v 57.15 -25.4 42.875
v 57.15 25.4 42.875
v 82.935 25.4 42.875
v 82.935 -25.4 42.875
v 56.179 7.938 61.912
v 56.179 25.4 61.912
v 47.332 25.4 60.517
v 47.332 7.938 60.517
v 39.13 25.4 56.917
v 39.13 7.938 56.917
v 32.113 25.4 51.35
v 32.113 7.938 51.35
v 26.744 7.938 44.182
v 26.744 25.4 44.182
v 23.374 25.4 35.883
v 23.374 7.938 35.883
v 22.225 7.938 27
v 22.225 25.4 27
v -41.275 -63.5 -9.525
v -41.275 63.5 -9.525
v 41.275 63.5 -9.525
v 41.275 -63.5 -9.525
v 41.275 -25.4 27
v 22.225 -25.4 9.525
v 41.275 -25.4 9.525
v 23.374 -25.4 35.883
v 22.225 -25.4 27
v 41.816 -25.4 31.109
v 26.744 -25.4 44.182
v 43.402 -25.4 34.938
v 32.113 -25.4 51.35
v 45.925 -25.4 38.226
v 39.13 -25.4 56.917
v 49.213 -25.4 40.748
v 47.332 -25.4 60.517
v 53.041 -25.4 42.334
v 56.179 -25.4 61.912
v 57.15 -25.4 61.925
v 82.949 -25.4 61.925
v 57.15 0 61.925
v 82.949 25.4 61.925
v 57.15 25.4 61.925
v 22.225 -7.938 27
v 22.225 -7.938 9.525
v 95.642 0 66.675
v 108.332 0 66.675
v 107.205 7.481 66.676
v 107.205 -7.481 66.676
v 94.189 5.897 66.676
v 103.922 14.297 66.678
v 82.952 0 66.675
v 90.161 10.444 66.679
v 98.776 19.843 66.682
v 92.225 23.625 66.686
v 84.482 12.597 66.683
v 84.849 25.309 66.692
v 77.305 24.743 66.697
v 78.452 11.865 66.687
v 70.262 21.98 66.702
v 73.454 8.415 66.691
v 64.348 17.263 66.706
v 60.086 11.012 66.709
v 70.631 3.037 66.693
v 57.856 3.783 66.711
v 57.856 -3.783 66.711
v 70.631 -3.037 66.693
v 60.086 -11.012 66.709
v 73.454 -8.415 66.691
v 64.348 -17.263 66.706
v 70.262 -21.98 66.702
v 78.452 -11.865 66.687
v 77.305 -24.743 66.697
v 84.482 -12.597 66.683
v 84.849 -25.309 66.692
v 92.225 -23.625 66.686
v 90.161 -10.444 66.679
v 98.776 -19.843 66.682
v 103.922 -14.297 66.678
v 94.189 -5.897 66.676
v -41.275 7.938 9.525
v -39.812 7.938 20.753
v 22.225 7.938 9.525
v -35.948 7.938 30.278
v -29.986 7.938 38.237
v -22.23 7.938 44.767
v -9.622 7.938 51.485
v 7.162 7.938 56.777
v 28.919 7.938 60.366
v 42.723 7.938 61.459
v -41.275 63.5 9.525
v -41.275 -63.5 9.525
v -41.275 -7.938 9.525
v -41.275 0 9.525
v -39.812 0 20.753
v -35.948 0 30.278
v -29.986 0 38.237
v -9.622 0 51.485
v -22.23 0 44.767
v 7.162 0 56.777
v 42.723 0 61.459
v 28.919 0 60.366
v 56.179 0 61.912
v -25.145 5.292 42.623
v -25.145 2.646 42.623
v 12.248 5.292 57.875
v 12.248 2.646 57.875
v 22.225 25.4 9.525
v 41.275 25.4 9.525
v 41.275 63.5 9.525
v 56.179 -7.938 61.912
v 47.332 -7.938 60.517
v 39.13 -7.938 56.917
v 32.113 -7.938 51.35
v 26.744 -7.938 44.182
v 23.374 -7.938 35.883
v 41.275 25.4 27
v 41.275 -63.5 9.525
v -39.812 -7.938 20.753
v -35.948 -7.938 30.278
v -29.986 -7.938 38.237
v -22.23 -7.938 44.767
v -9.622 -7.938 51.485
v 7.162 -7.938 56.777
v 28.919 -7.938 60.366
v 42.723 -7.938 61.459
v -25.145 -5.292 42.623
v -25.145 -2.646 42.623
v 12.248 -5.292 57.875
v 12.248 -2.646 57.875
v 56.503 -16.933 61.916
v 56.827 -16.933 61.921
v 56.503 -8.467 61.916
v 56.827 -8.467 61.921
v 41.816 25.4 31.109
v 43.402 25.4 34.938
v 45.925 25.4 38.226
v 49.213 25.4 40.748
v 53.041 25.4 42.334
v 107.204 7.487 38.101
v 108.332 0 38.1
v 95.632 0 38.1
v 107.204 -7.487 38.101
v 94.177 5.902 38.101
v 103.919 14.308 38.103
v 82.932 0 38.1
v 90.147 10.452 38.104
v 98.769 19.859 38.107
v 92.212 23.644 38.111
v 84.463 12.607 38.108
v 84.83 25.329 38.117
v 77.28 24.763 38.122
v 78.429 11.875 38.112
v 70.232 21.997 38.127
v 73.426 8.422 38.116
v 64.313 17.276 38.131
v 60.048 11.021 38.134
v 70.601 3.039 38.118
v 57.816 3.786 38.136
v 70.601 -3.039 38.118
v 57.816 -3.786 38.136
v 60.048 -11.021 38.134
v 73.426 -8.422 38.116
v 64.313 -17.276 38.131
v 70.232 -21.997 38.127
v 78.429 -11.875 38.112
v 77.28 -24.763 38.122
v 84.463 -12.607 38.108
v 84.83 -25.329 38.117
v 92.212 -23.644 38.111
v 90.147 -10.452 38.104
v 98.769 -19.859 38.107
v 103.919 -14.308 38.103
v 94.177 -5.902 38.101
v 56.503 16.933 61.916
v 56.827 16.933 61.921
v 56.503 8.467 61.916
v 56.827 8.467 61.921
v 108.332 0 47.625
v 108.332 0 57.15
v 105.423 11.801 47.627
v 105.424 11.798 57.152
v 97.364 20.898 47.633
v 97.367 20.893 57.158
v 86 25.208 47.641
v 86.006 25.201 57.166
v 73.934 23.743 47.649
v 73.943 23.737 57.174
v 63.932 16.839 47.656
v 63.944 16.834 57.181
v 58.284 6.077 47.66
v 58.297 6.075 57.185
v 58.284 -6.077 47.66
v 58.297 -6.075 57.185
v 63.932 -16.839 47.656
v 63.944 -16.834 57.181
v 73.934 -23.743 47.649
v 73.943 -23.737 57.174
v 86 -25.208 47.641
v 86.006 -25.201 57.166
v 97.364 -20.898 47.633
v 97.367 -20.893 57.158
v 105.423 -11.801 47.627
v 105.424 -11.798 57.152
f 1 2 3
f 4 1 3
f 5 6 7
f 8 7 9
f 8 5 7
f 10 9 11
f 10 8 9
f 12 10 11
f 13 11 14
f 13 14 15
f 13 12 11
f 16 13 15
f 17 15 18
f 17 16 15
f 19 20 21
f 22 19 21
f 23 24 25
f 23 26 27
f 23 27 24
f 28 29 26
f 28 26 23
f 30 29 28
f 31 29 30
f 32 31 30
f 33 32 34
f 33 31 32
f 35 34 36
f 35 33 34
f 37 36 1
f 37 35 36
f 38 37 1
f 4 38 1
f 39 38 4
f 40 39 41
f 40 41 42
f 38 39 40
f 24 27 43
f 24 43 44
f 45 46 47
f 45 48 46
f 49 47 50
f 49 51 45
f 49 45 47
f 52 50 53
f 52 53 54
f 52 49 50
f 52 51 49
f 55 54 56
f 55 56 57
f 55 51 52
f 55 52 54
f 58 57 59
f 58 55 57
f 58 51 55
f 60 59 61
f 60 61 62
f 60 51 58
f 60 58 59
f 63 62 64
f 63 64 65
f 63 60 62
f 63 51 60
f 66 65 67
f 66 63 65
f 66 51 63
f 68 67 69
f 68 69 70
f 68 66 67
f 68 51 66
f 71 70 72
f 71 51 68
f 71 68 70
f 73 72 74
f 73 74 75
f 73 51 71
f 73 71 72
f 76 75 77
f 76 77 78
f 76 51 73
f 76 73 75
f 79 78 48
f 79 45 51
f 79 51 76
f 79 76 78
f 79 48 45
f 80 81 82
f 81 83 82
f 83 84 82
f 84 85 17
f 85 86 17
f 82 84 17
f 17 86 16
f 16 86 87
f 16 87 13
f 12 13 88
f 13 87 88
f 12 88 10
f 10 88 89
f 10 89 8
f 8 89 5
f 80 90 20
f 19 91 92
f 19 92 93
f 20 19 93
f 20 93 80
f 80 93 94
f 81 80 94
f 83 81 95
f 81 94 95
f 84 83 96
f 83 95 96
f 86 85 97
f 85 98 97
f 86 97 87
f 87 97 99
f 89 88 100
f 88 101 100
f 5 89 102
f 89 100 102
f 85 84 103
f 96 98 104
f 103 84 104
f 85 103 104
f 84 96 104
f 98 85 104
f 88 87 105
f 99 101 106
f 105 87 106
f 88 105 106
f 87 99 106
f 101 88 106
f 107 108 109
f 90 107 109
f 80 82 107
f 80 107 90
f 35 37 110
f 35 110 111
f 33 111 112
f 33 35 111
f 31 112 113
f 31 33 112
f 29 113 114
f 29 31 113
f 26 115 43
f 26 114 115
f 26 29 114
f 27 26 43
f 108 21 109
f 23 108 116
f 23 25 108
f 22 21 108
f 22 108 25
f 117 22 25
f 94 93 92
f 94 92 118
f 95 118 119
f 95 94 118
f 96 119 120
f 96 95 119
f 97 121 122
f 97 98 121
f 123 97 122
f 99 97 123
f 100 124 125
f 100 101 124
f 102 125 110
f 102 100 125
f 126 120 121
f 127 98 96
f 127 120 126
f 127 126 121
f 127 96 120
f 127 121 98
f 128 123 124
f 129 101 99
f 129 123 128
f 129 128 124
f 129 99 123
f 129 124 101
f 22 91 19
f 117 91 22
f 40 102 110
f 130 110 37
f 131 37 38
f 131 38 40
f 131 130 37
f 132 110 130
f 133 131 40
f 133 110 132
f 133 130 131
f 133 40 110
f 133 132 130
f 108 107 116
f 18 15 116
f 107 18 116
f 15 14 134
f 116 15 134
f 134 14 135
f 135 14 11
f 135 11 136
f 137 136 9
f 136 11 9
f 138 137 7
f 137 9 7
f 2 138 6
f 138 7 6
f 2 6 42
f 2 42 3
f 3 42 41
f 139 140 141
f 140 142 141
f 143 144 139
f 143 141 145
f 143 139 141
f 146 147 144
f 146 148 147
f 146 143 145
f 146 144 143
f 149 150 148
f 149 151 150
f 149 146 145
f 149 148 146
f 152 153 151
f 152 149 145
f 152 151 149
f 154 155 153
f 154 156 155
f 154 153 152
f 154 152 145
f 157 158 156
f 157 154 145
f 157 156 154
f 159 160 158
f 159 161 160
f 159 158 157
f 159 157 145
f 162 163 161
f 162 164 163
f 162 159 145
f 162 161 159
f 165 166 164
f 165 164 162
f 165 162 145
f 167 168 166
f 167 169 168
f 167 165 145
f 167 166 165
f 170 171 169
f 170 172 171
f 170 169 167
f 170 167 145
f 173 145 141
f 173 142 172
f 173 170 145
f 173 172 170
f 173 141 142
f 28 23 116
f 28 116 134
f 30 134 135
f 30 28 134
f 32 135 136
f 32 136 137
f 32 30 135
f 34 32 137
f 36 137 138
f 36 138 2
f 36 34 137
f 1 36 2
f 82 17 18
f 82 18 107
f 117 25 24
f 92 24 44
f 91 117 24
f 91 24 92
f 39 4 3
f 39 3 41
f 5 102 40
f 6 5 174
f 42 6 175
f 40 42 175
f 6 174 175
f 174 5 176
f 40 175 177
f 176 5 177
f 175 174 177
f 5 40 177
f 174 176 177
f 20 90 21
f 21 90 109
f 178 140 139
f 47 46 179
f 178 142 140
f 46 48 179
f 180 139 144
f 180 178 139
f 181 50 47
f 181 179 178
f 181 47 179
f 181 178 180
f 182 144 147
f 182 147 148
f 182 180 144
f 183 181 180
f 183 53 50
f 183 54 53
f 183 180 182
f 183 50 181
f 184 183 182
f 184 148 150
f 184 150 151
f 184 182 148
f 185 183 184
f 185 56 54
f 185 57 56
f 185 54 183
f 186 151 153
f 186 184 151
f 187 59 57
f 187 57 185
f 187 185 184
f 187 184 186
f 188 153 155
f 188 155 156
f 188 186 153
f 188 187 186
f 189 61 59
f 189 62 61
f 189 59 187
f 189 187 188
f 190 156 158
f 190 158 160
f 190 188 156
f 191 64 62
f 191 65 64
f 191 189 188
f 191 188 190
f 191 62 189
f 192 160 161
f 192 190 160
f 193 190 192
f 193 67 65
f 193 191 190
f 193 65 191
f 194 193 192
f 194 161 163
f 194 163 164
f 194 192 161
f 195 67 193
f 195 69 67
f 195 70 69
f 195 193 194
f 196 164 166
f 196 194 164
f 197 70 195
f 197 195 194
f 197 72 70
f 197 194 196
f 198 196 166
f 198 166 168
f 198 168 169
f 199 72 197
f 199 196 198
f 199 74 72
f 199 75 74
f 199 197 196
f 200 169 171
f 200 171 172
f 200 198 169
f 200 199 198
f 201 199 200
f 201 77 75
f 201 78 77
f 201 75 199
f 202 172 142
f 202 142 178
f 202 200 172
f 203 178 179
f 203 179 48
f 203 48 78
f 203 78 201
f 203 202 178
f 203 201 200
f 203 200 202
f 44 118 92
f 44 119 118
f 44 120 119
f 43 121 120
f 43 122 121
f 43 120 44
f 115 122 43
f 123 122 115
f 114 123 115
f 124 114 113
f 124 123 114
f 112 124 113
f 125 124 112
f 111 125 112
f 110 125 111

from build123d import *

# Parameters (mm, degrees)
F1_DEPTH = 63.5
F2_DEPTH = 25.4
F3_DEPTH = 7.9375


with BuildPart() as f1:
    # F0 (on Front) → F1 (new body, symmetric)
    with BuildSketch(Plane.XZ):
        Polygon((41.275, -9.525), (41.275, 9.525), (22.225, 9.525), (-41.275, 9.525), (-41.275, -9.525), align=None)
    extrude(amount=F1_DEPTH, both=True)

    # F0 (on Front) → F2 (join, symmetric)
    with BuildSketch(Plane.XZ):
        with BuildLine():
            Line((22.225, 9.525), (41.275, 9.525))
            Line((41.275, 9.525), (41.275, 27.0002))
            ThreePointArc((41.275, 27.0002), (45.9246798487, 38.2255201513), (57.15, 42.8752))
            Line((57.15, 42.8752), (57.532105205, 42.8752))
            Line((57.532105205, 42.8752), (57.532105205, 61.9252))
            Line((57.532105205, 61.9252), (57.15, 61.9252))
            add(Edge.make_bspline(
                [(56.1791029201, 61.9117021713), (56.5034675496, 61.9166015255), (56.827109874, 61.9210963149), (57.15, 61.9252)],
                knots=[110.6558561405, 110.6558561405, 110.6558561405, 110.6558561405, 111.5045361635, 111.5045361635, 111.5045361635, 111.5045361635], degree=3))
            ThreePointArc((56.1791029201, 61.9117021713), (32.1133847583, 51.3502209906), (22.225, 27.0002))
            Line((22.225, 27.0002), (22.225, 9.525))
        make_face()
        Polygon((57.532105205, 61.9252), (57.532105205, 42.8752), (82.9354883984, 42.8752), (82.9489851804, 61.9252), align=None)
    extrude(amount=F2_DEPTH, both=True)

    # F0 (on Front) → F3 (join, symmetric)
    with BuildSketch(Plane.XZ):
        with BuildLine():
            Line((-41.275, 9.525), (22.225, 9.525))
            Line((22.225, 9.525), (22.225, 27.0002))
            ThreePointArc((22.225, 27.0002), (32.1133847583, 51.3502209906), (56.1791029201, 61.9117021713))
            add(Edge.make_bspline(
                [(-41.275, 9.525), (-40.6855292219, 53.7562988264), (13.8865488249, 61.2728957708), (56.1791029201, 61.9117021713)],
                knots=[0, 0, 0, 0, 110.6558561405, 110.6558561405, 110.6558561405, 110.6558561405], degree=3))
        make_face()
    extrude(amount=F3_DEPTH, both=True)


with BuildPart() as f4:
    # F0 (on Front) → F4 (revolve)
    with BuildSketch(Plane.XZ):
        Polygon((82.9489851804, 61.9252), (82.9354883984, 42.8752), (82.932105205, 38.1), (108.332105205, 38.1), (108.332105205, 66.675), (82.952350378, 66.675), align=None)
    revolve(axis=Axis((82.9422277915, 0, 52.3875), (0.0007084923, 0, 0.999999749)))


solid = Compound([f1.part, f4.part])
